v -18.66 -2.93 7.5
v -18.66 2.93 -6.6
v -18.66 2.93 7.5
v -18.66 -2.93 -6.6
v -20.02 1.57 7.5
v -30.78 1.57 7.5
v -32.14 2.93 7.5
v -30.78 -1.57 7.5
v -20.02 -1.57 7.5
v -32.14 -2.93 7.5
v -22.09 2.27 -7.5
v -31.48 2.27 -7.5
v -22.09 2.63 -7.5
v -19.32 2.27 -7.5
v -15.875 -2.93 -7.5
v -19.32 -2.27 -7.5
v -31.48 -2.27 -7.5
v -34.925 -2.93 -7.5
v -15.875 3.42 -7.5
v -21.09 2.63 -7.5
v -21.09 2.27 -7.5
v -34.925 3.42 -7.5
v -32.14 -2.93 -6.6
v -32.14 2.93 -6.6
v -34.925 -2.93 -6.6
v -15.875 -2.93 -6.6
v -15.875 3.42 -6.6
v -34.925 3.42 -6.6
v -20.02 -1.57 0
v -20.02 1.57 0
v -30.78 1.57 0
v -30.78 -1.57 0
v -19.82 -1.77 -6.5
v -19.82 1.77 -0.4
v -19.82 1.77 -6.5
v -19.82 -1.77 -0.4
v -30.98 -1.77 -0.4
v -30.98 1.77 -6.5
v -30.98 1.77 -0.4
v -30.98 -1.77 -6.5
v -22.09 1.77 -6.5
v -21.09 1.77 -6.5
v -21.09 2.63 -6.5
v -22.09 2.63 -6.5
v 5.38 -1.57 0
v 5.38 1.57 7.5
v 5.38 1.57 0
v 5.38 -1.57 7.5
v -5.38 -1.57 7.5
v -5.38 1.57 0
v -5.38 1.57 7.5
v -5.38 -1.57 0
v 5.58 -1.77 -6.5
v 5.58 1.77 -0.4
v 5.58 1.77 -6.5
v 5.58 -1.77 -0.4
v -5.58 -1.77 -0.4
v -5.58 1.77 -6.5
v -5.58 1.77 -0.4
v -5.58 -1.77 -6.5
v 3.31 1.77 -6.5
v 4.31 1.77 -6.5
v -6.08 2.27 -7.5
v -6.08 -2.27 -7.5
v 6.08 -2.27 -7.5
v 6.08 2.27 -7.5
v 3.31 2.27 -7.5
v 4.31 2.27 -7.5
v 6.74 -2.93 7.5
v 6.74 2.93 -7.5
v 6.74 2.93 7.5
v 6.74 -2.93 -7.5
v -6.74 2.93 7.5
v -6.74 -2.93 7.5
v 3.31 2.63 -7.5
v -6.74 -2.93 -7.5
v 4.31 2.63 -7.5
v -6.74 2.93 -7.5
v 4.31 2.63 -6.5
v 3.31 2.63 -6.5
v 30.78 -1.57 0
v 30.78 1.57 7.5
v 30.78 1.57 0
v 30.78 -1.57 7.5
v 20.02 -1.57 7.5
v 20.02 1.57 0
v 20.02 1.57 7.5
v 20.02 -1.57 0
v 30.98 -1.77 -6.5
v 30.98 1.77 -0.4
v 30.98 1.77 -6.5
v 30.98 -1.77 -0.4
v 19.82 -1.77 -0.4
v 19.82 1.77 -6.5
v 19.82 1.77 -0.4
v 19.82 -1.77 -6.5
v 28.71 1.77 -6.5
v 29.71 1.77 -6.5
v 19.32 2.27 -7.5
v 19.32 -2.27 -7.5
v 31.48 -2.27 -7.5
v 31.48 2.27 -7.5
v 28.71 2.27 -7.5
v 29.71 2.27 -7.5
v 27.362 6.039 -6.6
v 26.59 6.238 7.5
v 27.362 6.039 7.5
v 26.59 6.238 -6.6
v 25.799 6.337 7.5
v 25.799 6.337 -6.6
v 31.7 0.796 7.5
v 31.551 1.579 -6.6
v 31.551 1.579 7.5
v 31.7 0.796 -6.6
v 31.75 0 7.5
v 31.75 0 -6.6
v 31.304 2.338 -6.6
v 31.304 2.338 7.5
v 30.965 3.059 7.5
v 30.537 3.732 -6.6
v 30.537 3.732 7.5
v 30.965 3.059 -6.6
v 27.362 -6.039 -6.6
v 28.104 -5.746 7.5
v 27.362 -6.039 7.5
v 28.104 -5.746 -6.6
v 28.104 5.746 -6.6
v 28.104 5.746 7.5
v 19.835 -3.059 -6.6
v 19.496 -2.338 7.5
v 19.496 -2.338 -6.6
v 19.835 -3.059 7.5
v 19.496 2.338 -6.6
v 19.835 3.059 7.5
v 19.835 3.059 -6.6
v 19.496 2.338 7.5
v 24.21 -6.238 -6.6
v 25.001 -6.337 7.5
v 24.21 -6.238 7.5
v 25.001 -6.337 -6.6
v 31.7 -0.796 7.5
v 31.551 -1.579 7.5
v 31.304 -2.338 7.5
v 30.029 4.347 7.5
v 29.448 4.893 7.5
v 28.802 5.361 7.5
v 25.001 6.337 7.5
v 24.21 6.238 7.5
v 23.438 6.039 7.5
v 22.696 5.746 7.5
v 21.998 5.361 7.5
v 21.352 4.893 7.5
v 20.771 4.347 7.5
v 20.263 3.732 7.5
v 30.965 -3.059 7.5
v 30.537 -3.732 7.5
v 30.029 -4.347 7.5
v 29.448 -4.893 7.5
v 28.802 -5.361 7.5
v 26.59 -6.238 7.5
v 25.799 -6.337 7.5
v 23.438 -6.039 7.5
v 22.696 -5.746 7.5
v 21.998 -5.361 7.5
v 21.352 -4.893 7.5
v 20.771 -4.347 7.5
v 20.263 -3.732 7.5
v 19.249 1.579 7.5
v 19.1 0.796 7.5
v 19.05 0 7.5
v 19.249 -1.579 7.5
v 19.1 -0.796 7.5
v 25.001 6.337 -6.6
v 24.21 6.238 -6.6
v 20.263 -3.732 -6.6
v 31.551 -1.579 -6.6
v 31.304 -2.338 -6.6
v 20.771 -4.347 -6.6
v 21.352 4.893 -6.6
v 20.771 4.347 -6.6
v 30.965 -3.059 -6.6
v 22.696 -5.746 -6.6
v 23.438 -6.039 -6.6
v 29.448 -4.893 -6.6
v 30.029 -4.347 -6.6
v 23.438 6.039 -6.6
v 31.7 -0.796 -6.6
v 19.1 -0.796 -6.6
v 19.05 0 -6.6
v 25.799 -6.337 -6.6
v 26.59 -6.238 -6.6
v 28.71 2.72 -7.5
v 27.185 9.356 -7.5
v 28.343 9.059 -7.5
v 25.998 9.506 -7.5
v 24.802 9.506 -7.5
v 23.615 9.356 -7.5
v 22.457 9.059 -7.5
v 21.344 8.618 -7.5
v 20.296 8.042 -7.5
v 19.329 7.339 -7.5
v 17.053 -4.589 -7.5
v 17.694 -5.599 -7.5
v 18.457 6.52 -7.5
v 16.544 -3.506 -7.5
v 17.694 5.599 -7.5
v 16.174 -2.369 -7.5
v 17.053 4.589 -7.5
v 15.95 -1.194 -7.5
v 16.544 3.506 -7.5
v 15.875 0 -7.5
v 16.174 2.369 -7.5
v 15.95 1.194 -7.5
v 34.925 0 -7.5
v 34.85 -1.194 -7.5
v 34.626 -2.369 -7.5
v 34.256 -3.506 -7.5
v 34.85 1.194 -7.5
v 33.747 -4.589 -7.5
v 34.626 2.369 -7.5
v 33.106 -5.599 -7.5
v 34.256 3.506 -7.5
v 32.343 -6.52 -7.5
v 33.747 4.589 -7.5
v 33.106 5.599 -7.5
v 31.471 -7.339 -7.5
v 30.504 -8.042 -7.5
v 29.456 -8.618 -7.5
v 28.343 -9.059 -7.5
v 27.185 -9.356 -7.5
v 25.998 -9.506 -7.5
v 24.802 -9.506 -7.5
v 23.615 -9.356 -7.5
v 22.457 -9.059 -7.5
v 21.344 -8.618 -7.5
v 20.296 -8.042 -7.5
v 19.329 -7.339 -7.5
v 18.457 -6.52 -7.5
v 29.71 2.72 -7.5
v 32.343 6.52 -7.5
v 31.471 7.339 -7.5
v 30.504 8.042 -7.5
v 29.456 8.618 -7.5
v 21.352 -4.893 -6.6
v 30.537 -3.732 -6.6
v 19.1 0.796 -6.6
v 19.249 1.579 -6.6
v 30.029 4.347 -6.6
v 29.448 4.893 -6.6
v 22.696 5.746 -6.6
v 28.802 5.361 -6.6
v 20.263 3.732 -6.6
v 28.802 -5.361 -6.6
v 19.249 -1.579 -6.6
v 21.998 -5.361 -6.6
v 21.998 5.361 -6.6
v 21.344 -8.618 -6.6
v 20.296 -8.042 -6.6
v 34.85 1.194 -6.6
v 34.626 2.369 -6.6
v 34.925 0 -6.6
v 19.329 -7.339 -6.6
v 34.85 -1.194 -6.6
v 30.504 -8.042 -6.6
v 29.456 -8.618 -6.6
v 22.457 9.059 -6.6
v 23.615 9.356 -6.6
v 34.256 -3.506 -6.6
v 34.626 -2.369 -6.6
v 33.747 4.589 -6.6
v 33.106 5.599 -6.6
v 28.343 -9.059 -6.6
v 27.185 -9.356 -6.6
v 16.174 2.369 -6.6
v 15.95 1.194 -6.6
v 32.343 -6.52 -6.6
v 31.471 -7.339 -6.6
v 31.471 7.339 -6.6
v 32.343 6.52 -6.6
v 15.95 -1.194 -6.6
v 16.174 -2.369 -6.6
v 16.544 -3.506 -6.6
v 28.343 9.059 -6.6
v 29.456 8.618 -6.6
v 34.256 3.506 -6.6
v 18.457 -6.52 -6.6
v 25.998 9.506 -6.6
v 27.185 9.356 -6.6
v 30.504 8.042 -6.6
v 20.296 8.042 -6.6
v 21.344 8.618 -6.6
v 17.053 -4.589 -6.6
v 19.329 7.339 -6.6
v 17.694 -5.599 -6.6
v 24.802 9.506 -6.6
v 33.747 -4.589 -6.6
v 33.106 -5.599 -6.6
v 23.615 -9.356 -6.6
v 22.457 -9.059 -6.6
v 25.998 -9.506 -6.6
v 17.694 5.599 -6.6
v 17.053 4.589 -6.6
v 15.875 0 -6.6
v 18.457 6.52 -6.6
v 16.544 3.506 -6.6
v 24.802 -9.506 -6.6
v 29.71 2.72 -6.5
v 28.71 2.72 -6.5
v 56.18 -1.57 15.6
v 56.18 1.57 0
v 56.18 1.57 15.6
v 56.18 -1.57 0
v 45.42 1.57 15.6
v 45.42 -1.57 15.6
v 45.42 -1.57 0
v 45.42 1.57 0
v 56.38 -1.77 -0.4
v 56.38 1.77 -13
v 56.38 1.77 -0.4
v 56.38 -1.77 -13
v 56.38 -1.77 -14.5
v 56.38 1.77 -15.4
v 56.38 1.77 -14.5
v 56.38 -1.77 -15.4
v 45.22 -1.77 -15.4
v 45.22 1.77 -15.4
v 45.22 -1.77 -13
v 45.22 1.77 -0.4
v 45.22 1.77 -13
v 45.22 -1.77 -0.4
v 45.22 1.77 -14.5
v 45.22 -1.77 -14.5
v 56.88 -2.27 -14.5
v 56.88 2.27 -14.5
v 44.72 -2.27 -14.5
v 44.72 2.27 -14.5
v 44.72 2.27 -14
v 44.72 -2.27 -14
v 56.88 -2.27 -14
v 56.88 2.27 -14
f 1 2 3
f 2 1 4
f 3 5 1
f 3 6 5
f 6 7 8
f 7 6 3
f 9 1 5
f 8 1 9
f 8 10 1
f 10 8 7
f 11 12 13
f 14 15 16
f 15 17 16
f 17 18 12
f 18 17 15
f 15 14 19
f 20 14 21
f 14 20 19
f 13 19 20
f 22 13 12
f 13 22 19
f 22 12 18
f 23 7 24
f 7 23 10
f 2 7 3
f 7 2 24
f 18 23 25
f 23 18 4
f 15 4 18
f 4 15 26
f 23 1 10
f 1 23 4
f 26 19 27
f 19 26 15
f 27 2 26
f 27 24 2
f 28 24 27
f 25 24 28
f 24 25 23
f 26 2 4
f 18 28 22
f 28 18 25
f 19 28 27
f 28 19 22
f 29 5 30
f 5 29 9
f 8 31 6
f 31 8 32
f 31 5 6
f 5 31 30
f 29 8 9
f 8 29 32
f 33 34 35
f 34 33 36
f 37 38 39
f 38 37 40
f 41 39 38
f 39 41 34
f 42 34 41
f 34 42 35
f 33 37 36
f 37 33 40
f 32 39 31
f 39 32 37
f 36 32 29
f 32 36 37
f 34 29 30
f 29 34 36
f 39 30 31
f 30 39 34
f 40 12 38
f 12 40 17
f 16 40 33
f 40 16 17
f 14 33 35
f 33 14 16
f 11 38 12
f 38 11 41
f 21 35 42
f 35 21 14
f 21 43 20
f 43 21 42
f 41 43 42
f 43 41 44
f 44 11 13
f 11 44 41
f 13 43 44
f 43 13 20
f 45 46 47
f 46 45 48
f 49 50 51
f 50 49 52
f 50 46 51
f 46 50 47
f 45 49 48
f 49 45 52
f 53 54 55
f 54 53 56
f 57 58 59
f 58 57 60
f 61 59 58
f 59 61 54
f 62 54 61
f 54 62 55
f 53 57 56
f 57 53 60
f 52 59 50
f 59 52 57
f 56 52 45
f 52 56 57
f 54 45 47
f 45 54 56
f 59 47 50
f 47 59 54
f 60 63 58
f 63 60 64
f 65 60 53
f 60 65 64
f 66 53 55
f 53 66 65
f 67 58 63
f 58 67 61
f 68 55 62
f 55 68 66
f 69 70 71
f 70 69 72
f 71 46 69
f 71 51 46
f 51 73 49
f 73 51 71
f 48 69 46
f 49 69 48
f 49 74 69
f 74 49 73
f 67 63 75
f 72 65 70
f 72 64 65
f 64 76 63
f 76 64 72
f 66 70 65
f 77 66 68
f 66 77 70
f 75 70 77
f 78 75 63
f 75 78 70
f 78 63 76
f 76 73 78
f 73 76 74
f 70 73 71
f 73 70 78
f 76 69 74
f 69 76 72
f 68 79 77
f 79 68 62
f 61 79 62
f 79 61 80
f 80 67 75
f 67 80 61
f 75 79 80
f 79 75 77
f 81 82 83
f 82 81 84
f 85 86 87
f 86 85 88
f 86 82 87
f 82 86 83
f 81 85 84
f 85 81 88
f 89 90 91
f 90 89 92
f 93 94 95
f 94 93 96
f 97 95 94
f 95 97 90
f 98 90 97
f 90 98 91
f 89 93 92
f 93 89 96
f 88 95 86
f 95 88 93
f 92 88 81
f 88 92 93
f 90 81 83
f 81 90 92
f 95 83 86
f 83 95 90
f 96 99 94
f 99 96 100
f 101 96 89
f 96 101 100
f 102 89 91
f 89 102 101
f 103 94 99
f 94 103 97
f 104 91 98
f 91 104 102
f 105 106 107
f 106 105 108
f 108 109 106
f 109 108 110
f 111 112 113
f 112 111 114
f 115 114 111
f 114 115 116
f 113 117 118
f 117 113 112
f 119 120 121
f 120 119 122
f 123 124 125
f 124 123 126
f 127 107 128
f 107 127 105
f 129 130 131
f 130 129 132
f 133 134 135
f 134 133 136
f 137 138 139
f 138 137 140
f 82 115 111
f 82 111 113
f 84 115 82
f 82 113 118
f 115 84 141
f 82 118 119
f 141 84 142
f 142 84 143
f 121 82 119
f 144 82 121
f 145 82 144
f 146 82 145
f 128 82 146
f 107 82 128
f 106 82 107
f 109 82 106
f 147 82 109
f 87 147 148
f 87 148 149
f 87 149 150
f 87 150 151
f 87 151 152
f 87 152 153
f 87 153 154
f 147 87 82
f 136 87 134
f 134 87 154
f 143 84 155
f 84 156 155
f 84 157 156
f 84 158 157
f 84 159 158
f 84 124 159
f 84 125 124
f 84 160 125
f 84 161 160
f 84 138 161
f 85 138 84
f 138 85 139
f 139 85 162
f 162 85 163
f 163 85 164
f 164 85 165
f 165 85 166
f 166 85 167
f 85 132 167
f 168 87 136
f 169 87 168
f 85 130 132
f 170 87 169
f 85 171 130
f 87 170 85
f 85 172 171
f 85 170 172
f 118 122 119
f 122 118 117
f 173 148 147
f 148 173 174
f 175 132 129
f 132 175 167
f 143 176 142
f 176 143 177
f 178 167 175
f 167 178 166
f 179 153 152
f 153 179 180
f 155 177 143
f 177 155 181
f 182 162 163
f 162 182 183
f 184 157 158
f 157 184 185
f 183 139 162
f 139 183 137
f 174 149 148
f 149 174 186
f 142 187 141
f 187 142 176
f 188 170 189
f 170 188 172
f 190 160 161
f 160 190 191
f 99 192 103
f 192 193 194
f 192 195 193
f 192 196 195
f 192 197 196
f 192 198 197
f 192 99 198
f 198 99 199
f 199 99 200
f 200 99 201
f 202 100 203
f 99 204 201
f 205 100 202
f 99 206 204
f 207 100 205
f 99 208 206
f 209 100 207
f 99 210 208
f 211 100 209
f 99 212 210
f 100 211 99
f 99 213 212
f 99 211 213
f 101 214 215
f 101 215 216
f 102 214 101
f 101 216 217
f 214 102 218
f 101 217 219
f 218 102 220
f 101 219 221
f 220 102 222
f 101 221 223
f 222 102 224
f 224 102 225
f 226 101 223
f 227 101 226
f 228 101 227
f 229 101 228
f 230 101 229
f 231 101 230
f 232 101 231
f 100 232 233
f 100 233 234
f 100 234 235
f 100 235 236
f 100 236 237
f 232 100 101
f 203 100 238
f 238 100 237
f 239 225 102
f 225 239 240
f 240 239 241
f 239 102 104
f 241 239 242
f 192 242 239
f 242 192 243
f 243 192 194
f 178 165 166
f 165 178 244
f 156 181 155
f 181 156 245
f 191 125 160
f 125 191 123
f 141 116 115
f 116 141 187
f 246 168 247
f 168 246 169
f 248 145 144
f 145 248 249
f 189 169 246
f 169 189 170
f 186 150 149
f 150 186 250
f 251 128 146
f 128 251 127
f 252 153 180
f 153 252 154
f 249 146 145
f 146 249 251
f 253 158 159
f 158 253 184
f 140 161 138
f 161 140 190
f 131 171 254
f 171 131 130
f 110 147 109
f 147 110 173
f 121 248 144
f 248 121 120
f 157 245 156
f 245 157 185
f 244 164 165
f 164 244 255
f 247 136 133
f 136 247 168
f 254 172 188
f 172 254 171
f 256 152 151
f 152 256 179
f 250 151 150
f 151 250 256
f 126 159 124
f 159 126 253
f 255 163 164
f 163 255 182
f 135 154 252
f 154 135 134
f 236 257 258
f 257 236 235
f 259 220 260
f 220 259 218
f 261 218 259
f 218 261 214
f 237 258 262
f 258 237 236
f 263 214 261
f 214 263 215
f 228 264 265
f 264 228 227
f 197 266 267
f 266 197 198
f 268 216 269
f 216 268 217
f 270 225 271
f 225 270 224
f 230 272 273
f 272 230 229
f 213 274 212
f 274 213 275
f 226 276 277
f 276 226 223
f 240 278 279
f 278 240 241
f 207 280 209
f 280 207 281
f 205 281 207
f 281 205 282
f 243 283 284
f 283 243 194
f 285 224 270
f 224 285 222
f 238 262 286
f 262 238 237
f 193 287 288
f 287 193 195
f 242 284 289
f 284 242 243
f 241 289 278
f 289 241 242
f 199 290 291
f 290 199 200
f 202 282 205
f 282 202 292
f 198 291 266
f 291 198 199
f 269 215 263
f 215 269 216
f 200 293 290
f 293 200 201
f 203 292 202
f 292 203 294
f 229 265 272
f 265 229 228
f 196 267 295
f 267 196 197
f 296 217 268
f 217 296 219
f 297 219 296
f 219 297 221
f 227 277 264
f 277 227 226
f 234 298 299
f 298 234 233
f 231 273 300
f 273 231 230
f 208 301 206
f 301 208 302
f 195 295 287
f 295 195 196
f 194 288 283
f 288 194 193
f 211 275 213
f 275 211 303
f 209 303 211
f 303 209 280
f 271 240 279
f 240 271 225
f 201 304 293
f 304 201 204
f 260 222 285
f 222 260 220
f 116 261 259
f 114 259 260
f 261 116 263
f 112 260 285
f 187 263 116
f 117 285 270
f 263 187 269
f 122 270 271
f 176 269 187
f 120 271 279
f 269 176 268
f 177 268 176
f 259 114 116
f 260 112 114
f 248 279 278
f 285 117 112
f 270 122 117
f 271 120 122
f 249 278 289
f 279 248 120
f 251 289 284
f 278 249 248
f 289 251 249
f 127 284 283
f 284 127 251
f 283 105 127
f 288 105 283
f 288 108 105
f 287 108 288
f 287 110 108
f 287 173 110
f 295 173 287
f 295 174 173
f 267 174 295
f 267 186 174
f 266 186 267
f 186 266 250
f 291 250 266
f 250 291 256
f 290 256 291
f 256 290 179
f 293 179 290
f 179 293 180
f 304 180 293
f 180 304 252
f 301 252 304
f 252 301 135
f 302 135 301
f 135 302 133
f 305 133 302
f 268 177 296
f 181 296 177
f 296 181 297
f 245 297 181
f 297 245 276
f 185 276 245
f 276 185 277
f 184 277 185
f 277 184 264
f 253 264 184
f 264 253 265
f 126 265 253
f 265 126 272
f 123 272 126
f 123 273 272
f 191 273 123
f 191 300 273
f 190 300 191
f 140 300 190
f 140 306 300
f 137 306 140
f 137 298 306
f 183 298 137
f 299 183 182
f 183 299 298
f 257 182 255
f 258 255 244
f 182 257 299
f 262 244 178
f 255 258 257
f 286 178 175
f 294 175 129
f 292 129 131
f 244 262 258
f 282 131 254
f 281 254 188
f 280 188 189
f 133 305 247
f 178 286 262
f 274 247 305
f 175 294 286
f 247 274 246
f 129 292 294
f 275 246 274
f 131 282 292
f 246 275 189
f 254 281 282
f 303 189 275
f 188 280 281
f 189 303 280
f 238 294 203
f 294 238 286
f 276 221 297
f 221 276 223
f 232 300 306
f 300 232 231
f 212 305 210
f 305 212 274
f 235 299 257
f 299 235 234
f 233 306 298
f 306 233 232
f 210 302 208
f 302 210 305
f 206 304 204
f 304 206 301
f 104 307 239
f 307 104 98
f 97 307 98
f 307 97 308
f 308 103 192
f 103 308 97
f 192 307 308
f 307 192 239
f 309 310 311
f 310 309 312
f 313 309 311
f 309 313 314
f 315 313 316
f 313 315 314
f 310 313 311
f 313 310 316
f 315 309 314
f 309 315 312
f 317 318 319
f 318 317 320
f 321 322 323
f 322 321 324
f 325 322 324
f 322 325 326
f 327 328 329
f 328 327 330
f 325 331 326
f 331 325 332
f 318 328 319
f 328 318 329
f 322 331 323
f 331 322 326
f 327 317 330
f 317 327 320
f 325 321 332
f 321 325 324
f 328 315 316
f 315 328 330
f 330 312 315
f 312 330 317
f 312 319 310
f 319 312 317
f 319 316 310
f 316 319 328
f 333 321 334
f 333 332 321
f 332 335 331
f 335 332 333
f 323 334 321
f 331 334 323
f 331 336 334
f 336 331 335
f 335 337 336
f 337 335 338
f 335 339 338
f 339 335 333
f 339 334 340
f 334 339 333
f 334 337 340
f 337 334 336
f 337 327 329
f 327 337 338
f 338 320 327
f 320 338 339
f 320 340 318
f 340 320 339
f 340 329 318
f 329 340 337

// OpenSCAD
// MiniPVSleeve-v5.0
//
// Versions:
// v3: 2018-02-03
// - Same as ProjectNotes2/2018/MiniPVSleeve/MiniPVSleeve-v3.scad,
//   a.k.a. x-git-object:6fff61a76d842dfa115b24c827d32c9b12e57355
// v5.0: 2023-07-25
// - Refactoring/clean-up, esp. to make configurable parameters make sense
// - Default parameter values remain the same as 0.3's

connector_length = 14;
flange_thickness = 0.9;

size = [4,1];

cavity_mode = "differential"; // ["straight","bulkhead","differential"]

/* [Differential Cavity] */
back_margin  = 0.3;
front_margin = 0.5;

/* [Straight/Bulkhead] */
margin = 0.4; // v2: Increased from 0.2 to 0.4
bulkhead_lip_width = 0.5;

/* [Detail] */

$fn = 50;

module __asdasd_end_params() { };

function mm(millimeters) = millimeters;
function inches(inc) = mm(25.4 * inc);
function pvunits(hole_count) = mm(2.54 * hole_count);
// For 3D printing stuff, Dad says make thickness a multiple of 0.3mm.
// Width is less important but a multiple of 0.42mm might work best.
function extruded_beads(bead_count) = mm(0.42 * bead_count);

function unit_ceil(unit, value) =
	ceil(value / unit) * unit;

// Let's say wires going along z,
// so connection interface is the x/y plane.

// Using https://www.amazon.com/dp/B01NAB4GT6 as guide,
// a connector is 14mm long, 2.54 thick, and up to 0.1mm longer
// wider than you'd expect (e.g. their 1p is listed as 2.64mm wide,
// while their 2p is exactly 2x2.54mm = 5.08mm).  *shrug*
// The pins themselves are about 0.65mm square

bulkhead_thickness = bulkhead_lip_width*2;

cm_straight = "straight";
cm_bulkhead = "bulkhead";
cm_diff = "differential";
cm_default = cm_straight;

module pyramid(width, depth, height) {
	polyhedron([
		[-width/2, -depth/2, 0],
		[+width/2, -depth/2, 0],
		[-width/2, +depth/2, 0],
		[+width/2, +depth/2, 0],
		[0, 0, height]
	], [
		[0, 1, 3, 2],
		[0, 4, 1],
		[1, 4, 3],
		[3, 4, 2],
		[2, 4, 0]
	]);
}

// Overhangy prism
module ohprism(width, depth, height) {
	polyhedron([
		[-width/2,-depth/2,+height/2],
		[-width/2,+depth/2,+height/2],
		[-width/2,-depth/2,-height/2],
		[+width/2,-depth/2,+height/2],
		[+width/2,+depth/2,+height/2],
		[+width/2,-depth/2,-height/2]
	], [
		[0,2,1],
		[3,4,5],
		[2,0,3,5],
		[0,1,4,3],
		[4,1,2,5]
	]);
}

module bulkhead(columns, rows) {
	for( rot=[0:180:180] ) {
		rotate([0,0,rot]) {
			translate([0,-pvunits(rows)/2,0]) {
				ohprism(pvunits(columns)+margin*4, bulkhead_lip_width*2, bulkhead_lip_width*4);
			}
		}
	}
	for( rot=[90,180,270] ) {
		rotate([0,0,rot]) {
			translate([0,-pvunits(columns)/2,0]) {
				ohprism(pvunits(rows)+margin*4, bulkhead_lip_width*2, bulkhead_lip_width*4);
			}
		}
	}
	/*
	difference() {
		cube([
			pvunits(columns)+margin+0.05,
			pvunits(rows)+margin+0.05,
			bulkhead_thickness
		], true);
		// Hole big enough for pins to go through, but that blocks
		// connector housing
		cube([
			pvunits(columns - 1) + mm(1.5),
			pvunits(rows - 1) + mm(1.5),
			1,
		], true);
	}
	*/
}

sleeve_length = connector_length + bulkhead_thickness;
pin_marker_size = mm(1);

function sleeve_cavity_width(columns, margin=margin) = pvunits(columns) + margin*2;
function sleeve_cavity_diagonal(columns,rows,margin=margin) =
	sqrt(pow(pvunits(columns) + margin*2, 2) +
		 pow(pvunits(rows) + margin*2, 2));

module rectangular_opening_widener(width, height, border) {
	polyhedron([
		[-width/2-border, -height/2-border, -border  ],
		[+width/2+border, -height/2-border, -border  ],
		[-width/2-border, +height/2+border, -border  ],
		[+width/2+border, +height/2+border, -border  ],
		[-width/2-border, -height/2-border,         0],
		[+width/2+border, -height/2-border,         0],
		[-width/2-border, +height/2+border,         0],
		[+width/2+border, +height/2+border,         0],
		[-width/2       , -height/2       , +border*2],
		[+width/2       , -height/2       , +border*2],
		[-width/2       , +height/2       , +border*2],
		[+width/2       , +height/2       , +border*2]
	], [
		[2,3,1,0], // bottom
		[2,0,4,6], // flat sides...
		[0,1,5,4],
		[1,3,7,5],
		[3,2,6,7],
		[6,4,8,10], // tapered sides...
		[4,5,9,8],
		[5,7,11,9],
		[7,6,10,11],
		[8,9,11,10] // top
	]);
}

module diff_sleeve_cavity(
	columns, rows,
	sleeve_length=connector_length*2,
	back_margin=back_margin,
	front_margin=front_margin
) {
	back_hole_width   = sleeve_cavity_width(columns, back_margin);
	back_hole_height  = sleeve_cavity_width(rows, back_margin);
	front_hole_width  = sleeve_cavity_width(columns, front_margin);
	front_hole_height = sleeve_cavity_width(rows, front_margin);
	taper_dx = front_margin - back_margin;
	taper_dz = taper_dx * 2;
	half_length = (sleeve_length+2)/2;
	translate([0, 0, +half_length/2-taper_dz]) cube([back_hole_width,back_hole_height,half_length+2], true);
	translate([0, 0, -half_length/2-taper_dz]) cube([front_hole_width,front_hole_height,half_length], true);
	translate([0, 0, -taper_dz])
		rectangular_opening_widener(back_hole_width, back_hole_height, taper_dx);
	translate([0,0,-sleeve_length/2])
		rectangular_opening_widener(front_hole_width, front_hole_height, mm(0.5));
}

module sleeve_cavity(
	columns, rows,
	sleeve_length=connector_length*2,
	cavity_mode = cm_default,
	back_margin = back_margin,
	front_margin = front_margin
) {
	if( cavity_mode == cm_diff ) {
		diff_sleeve_cavity(
			columns, rows,
			sleeve_length=sleeve_length,
			back_margin = back_margin,
			front_margin = front_margin
		);
	} else {
		hole_width = sleeve_cavity_width(columns);
		hole_height = sleeve_cavity_width(rows);
		difference() {
			union() {
				cube([hole_width,hole_height,sleeve_length + 1], true);
				translate([0,0,-sleeve_length/2])
					rectangular_opening_widener(hole_width, hole_height, mm(0.5));
			}
			if(cavity_mode == cm_bulkhead) bulkhead(columns,rows);
		}
	}
}

module pin_marker(width=pin_marker_size+0.1) {
	cube([pin_marker_size, width, pin_marker_size*2], center=true);
}

module rectangular_sleeve(
	columns, rows,
	sleeve_wall_thickness = extruded_beads(3),
	flange_width = 0,
	flange_height = 0,
	flange_thickness = flange_thickness,
	cavity_mode = cm_default
) {
	hole_width = sleeve_cavity_width(columns);
	hole_height = sleeve_cavity_width(rows);
	inner_box_width = hole_width + sleeve_wall_thickness * 2;
	inner_box_height = hole_height + sleeve_wall_thickness * 2;
		
	adj_flange_width = max(flange_width, inner_box_width);
	adj_flange_height = max(flange_height, inner_box_height);
	
	//cube([
	difference() {
		union() {
			cube([inner_box_width,inner_box_height,sleeve_length], true);
			
			translate([0, (adj_flange_height - inner_box_height)/2, 0 - sleeve_length/2 + flange_thickness/2]) {
				cube([adj_flange_width, adj_flange_height, flange_thickness], true);
			}
		}
		sleeve_cavity(columns, rows, sleeve_length=sleeve_length, cavity_mode=cavity_mode);
		translate([pvunits(columns-1)/2, pvunits(rows)/2+margin+sleeve_wall_thickness/2-0.3, -sleeve_length/2]) {
			pin_marker(width=sleeve_wall_thickness);
		}
	};
}

module round_sleeve(
	columns, rows,
	diameter = 0,
	flange_diameter = 0,
	flange_thickness = flange_thickness,
	cavity_mode = cm_default
) {
	diameter = unit_ceil(inches(1/16), sleeve_cavity_diagonal(columns, rows)+extruded_beads(2));
	echo(columns, "x", rows, " peg is ", (diameter / inches(1/16)), " sixteenths of an inch in diameter");
	
	difference() {
		union() {
			cylinder(d=diameter, h=sleeve_length, center=true);
			translate([0, 0, 0 - sleeve_length/2 + flange_thickness/2]) {
				cylinder(d=flange_diameter, h=flange_thickness, center=true);
			}
		}
		
		sleeve_cavity(columns, rows, sleeve_length=sleeve_length, cavity_mode=cavity_mode);
		translate([pvunits(columns-1)/2, pvunits(rows)/2+margin+pin_marker_size/2, -sleeve_length/2]) {
			pin_marker();
		}
	}
}

function sample_spacing(samps) = inches(samps);
function sample_position(sx,sy) = [sample_spacing(sx), sample_spacing(sy), 0];

module outer_shape_variations(
	columns, rows,
	cavity_mode = cm_default
) {
	// Connector for burying in epoxy
	translate(sample_position(-1, 0)) {
		rectangular_sleeve(columns, rows,
			flange_width=inches(3/4),
			flange_height=inches(1/4),
			cavity_mode=cavity_mode
		);
	}
	// Inline connector
	translate(sample_position( 0, 0)) {
		rectangular_sleeve(columns, rows,
			flange_width=0,
			cavity_mode=cavity_mode
		);
	}
	// Round connector for inserting into drilled hole
	translate(sample_position(+1, 0)) {
		round_sleeve(4,1,
			flange_diameter=inches(3/4),
			cavity_mode=cavity_mode
		);
	}
	translate(sample_position(+2, 0)) {
		sleeve_cavity(4, 1, cavity_mode=cavity_mode);
	}
}

module variations(
	columns, rows
) {
	translate(sample_position(0,0)) {
		outer_shape_variations(columns, rows, cavity_mode=cavity_mode);
	}
}

variations(size[0], size[1]);
